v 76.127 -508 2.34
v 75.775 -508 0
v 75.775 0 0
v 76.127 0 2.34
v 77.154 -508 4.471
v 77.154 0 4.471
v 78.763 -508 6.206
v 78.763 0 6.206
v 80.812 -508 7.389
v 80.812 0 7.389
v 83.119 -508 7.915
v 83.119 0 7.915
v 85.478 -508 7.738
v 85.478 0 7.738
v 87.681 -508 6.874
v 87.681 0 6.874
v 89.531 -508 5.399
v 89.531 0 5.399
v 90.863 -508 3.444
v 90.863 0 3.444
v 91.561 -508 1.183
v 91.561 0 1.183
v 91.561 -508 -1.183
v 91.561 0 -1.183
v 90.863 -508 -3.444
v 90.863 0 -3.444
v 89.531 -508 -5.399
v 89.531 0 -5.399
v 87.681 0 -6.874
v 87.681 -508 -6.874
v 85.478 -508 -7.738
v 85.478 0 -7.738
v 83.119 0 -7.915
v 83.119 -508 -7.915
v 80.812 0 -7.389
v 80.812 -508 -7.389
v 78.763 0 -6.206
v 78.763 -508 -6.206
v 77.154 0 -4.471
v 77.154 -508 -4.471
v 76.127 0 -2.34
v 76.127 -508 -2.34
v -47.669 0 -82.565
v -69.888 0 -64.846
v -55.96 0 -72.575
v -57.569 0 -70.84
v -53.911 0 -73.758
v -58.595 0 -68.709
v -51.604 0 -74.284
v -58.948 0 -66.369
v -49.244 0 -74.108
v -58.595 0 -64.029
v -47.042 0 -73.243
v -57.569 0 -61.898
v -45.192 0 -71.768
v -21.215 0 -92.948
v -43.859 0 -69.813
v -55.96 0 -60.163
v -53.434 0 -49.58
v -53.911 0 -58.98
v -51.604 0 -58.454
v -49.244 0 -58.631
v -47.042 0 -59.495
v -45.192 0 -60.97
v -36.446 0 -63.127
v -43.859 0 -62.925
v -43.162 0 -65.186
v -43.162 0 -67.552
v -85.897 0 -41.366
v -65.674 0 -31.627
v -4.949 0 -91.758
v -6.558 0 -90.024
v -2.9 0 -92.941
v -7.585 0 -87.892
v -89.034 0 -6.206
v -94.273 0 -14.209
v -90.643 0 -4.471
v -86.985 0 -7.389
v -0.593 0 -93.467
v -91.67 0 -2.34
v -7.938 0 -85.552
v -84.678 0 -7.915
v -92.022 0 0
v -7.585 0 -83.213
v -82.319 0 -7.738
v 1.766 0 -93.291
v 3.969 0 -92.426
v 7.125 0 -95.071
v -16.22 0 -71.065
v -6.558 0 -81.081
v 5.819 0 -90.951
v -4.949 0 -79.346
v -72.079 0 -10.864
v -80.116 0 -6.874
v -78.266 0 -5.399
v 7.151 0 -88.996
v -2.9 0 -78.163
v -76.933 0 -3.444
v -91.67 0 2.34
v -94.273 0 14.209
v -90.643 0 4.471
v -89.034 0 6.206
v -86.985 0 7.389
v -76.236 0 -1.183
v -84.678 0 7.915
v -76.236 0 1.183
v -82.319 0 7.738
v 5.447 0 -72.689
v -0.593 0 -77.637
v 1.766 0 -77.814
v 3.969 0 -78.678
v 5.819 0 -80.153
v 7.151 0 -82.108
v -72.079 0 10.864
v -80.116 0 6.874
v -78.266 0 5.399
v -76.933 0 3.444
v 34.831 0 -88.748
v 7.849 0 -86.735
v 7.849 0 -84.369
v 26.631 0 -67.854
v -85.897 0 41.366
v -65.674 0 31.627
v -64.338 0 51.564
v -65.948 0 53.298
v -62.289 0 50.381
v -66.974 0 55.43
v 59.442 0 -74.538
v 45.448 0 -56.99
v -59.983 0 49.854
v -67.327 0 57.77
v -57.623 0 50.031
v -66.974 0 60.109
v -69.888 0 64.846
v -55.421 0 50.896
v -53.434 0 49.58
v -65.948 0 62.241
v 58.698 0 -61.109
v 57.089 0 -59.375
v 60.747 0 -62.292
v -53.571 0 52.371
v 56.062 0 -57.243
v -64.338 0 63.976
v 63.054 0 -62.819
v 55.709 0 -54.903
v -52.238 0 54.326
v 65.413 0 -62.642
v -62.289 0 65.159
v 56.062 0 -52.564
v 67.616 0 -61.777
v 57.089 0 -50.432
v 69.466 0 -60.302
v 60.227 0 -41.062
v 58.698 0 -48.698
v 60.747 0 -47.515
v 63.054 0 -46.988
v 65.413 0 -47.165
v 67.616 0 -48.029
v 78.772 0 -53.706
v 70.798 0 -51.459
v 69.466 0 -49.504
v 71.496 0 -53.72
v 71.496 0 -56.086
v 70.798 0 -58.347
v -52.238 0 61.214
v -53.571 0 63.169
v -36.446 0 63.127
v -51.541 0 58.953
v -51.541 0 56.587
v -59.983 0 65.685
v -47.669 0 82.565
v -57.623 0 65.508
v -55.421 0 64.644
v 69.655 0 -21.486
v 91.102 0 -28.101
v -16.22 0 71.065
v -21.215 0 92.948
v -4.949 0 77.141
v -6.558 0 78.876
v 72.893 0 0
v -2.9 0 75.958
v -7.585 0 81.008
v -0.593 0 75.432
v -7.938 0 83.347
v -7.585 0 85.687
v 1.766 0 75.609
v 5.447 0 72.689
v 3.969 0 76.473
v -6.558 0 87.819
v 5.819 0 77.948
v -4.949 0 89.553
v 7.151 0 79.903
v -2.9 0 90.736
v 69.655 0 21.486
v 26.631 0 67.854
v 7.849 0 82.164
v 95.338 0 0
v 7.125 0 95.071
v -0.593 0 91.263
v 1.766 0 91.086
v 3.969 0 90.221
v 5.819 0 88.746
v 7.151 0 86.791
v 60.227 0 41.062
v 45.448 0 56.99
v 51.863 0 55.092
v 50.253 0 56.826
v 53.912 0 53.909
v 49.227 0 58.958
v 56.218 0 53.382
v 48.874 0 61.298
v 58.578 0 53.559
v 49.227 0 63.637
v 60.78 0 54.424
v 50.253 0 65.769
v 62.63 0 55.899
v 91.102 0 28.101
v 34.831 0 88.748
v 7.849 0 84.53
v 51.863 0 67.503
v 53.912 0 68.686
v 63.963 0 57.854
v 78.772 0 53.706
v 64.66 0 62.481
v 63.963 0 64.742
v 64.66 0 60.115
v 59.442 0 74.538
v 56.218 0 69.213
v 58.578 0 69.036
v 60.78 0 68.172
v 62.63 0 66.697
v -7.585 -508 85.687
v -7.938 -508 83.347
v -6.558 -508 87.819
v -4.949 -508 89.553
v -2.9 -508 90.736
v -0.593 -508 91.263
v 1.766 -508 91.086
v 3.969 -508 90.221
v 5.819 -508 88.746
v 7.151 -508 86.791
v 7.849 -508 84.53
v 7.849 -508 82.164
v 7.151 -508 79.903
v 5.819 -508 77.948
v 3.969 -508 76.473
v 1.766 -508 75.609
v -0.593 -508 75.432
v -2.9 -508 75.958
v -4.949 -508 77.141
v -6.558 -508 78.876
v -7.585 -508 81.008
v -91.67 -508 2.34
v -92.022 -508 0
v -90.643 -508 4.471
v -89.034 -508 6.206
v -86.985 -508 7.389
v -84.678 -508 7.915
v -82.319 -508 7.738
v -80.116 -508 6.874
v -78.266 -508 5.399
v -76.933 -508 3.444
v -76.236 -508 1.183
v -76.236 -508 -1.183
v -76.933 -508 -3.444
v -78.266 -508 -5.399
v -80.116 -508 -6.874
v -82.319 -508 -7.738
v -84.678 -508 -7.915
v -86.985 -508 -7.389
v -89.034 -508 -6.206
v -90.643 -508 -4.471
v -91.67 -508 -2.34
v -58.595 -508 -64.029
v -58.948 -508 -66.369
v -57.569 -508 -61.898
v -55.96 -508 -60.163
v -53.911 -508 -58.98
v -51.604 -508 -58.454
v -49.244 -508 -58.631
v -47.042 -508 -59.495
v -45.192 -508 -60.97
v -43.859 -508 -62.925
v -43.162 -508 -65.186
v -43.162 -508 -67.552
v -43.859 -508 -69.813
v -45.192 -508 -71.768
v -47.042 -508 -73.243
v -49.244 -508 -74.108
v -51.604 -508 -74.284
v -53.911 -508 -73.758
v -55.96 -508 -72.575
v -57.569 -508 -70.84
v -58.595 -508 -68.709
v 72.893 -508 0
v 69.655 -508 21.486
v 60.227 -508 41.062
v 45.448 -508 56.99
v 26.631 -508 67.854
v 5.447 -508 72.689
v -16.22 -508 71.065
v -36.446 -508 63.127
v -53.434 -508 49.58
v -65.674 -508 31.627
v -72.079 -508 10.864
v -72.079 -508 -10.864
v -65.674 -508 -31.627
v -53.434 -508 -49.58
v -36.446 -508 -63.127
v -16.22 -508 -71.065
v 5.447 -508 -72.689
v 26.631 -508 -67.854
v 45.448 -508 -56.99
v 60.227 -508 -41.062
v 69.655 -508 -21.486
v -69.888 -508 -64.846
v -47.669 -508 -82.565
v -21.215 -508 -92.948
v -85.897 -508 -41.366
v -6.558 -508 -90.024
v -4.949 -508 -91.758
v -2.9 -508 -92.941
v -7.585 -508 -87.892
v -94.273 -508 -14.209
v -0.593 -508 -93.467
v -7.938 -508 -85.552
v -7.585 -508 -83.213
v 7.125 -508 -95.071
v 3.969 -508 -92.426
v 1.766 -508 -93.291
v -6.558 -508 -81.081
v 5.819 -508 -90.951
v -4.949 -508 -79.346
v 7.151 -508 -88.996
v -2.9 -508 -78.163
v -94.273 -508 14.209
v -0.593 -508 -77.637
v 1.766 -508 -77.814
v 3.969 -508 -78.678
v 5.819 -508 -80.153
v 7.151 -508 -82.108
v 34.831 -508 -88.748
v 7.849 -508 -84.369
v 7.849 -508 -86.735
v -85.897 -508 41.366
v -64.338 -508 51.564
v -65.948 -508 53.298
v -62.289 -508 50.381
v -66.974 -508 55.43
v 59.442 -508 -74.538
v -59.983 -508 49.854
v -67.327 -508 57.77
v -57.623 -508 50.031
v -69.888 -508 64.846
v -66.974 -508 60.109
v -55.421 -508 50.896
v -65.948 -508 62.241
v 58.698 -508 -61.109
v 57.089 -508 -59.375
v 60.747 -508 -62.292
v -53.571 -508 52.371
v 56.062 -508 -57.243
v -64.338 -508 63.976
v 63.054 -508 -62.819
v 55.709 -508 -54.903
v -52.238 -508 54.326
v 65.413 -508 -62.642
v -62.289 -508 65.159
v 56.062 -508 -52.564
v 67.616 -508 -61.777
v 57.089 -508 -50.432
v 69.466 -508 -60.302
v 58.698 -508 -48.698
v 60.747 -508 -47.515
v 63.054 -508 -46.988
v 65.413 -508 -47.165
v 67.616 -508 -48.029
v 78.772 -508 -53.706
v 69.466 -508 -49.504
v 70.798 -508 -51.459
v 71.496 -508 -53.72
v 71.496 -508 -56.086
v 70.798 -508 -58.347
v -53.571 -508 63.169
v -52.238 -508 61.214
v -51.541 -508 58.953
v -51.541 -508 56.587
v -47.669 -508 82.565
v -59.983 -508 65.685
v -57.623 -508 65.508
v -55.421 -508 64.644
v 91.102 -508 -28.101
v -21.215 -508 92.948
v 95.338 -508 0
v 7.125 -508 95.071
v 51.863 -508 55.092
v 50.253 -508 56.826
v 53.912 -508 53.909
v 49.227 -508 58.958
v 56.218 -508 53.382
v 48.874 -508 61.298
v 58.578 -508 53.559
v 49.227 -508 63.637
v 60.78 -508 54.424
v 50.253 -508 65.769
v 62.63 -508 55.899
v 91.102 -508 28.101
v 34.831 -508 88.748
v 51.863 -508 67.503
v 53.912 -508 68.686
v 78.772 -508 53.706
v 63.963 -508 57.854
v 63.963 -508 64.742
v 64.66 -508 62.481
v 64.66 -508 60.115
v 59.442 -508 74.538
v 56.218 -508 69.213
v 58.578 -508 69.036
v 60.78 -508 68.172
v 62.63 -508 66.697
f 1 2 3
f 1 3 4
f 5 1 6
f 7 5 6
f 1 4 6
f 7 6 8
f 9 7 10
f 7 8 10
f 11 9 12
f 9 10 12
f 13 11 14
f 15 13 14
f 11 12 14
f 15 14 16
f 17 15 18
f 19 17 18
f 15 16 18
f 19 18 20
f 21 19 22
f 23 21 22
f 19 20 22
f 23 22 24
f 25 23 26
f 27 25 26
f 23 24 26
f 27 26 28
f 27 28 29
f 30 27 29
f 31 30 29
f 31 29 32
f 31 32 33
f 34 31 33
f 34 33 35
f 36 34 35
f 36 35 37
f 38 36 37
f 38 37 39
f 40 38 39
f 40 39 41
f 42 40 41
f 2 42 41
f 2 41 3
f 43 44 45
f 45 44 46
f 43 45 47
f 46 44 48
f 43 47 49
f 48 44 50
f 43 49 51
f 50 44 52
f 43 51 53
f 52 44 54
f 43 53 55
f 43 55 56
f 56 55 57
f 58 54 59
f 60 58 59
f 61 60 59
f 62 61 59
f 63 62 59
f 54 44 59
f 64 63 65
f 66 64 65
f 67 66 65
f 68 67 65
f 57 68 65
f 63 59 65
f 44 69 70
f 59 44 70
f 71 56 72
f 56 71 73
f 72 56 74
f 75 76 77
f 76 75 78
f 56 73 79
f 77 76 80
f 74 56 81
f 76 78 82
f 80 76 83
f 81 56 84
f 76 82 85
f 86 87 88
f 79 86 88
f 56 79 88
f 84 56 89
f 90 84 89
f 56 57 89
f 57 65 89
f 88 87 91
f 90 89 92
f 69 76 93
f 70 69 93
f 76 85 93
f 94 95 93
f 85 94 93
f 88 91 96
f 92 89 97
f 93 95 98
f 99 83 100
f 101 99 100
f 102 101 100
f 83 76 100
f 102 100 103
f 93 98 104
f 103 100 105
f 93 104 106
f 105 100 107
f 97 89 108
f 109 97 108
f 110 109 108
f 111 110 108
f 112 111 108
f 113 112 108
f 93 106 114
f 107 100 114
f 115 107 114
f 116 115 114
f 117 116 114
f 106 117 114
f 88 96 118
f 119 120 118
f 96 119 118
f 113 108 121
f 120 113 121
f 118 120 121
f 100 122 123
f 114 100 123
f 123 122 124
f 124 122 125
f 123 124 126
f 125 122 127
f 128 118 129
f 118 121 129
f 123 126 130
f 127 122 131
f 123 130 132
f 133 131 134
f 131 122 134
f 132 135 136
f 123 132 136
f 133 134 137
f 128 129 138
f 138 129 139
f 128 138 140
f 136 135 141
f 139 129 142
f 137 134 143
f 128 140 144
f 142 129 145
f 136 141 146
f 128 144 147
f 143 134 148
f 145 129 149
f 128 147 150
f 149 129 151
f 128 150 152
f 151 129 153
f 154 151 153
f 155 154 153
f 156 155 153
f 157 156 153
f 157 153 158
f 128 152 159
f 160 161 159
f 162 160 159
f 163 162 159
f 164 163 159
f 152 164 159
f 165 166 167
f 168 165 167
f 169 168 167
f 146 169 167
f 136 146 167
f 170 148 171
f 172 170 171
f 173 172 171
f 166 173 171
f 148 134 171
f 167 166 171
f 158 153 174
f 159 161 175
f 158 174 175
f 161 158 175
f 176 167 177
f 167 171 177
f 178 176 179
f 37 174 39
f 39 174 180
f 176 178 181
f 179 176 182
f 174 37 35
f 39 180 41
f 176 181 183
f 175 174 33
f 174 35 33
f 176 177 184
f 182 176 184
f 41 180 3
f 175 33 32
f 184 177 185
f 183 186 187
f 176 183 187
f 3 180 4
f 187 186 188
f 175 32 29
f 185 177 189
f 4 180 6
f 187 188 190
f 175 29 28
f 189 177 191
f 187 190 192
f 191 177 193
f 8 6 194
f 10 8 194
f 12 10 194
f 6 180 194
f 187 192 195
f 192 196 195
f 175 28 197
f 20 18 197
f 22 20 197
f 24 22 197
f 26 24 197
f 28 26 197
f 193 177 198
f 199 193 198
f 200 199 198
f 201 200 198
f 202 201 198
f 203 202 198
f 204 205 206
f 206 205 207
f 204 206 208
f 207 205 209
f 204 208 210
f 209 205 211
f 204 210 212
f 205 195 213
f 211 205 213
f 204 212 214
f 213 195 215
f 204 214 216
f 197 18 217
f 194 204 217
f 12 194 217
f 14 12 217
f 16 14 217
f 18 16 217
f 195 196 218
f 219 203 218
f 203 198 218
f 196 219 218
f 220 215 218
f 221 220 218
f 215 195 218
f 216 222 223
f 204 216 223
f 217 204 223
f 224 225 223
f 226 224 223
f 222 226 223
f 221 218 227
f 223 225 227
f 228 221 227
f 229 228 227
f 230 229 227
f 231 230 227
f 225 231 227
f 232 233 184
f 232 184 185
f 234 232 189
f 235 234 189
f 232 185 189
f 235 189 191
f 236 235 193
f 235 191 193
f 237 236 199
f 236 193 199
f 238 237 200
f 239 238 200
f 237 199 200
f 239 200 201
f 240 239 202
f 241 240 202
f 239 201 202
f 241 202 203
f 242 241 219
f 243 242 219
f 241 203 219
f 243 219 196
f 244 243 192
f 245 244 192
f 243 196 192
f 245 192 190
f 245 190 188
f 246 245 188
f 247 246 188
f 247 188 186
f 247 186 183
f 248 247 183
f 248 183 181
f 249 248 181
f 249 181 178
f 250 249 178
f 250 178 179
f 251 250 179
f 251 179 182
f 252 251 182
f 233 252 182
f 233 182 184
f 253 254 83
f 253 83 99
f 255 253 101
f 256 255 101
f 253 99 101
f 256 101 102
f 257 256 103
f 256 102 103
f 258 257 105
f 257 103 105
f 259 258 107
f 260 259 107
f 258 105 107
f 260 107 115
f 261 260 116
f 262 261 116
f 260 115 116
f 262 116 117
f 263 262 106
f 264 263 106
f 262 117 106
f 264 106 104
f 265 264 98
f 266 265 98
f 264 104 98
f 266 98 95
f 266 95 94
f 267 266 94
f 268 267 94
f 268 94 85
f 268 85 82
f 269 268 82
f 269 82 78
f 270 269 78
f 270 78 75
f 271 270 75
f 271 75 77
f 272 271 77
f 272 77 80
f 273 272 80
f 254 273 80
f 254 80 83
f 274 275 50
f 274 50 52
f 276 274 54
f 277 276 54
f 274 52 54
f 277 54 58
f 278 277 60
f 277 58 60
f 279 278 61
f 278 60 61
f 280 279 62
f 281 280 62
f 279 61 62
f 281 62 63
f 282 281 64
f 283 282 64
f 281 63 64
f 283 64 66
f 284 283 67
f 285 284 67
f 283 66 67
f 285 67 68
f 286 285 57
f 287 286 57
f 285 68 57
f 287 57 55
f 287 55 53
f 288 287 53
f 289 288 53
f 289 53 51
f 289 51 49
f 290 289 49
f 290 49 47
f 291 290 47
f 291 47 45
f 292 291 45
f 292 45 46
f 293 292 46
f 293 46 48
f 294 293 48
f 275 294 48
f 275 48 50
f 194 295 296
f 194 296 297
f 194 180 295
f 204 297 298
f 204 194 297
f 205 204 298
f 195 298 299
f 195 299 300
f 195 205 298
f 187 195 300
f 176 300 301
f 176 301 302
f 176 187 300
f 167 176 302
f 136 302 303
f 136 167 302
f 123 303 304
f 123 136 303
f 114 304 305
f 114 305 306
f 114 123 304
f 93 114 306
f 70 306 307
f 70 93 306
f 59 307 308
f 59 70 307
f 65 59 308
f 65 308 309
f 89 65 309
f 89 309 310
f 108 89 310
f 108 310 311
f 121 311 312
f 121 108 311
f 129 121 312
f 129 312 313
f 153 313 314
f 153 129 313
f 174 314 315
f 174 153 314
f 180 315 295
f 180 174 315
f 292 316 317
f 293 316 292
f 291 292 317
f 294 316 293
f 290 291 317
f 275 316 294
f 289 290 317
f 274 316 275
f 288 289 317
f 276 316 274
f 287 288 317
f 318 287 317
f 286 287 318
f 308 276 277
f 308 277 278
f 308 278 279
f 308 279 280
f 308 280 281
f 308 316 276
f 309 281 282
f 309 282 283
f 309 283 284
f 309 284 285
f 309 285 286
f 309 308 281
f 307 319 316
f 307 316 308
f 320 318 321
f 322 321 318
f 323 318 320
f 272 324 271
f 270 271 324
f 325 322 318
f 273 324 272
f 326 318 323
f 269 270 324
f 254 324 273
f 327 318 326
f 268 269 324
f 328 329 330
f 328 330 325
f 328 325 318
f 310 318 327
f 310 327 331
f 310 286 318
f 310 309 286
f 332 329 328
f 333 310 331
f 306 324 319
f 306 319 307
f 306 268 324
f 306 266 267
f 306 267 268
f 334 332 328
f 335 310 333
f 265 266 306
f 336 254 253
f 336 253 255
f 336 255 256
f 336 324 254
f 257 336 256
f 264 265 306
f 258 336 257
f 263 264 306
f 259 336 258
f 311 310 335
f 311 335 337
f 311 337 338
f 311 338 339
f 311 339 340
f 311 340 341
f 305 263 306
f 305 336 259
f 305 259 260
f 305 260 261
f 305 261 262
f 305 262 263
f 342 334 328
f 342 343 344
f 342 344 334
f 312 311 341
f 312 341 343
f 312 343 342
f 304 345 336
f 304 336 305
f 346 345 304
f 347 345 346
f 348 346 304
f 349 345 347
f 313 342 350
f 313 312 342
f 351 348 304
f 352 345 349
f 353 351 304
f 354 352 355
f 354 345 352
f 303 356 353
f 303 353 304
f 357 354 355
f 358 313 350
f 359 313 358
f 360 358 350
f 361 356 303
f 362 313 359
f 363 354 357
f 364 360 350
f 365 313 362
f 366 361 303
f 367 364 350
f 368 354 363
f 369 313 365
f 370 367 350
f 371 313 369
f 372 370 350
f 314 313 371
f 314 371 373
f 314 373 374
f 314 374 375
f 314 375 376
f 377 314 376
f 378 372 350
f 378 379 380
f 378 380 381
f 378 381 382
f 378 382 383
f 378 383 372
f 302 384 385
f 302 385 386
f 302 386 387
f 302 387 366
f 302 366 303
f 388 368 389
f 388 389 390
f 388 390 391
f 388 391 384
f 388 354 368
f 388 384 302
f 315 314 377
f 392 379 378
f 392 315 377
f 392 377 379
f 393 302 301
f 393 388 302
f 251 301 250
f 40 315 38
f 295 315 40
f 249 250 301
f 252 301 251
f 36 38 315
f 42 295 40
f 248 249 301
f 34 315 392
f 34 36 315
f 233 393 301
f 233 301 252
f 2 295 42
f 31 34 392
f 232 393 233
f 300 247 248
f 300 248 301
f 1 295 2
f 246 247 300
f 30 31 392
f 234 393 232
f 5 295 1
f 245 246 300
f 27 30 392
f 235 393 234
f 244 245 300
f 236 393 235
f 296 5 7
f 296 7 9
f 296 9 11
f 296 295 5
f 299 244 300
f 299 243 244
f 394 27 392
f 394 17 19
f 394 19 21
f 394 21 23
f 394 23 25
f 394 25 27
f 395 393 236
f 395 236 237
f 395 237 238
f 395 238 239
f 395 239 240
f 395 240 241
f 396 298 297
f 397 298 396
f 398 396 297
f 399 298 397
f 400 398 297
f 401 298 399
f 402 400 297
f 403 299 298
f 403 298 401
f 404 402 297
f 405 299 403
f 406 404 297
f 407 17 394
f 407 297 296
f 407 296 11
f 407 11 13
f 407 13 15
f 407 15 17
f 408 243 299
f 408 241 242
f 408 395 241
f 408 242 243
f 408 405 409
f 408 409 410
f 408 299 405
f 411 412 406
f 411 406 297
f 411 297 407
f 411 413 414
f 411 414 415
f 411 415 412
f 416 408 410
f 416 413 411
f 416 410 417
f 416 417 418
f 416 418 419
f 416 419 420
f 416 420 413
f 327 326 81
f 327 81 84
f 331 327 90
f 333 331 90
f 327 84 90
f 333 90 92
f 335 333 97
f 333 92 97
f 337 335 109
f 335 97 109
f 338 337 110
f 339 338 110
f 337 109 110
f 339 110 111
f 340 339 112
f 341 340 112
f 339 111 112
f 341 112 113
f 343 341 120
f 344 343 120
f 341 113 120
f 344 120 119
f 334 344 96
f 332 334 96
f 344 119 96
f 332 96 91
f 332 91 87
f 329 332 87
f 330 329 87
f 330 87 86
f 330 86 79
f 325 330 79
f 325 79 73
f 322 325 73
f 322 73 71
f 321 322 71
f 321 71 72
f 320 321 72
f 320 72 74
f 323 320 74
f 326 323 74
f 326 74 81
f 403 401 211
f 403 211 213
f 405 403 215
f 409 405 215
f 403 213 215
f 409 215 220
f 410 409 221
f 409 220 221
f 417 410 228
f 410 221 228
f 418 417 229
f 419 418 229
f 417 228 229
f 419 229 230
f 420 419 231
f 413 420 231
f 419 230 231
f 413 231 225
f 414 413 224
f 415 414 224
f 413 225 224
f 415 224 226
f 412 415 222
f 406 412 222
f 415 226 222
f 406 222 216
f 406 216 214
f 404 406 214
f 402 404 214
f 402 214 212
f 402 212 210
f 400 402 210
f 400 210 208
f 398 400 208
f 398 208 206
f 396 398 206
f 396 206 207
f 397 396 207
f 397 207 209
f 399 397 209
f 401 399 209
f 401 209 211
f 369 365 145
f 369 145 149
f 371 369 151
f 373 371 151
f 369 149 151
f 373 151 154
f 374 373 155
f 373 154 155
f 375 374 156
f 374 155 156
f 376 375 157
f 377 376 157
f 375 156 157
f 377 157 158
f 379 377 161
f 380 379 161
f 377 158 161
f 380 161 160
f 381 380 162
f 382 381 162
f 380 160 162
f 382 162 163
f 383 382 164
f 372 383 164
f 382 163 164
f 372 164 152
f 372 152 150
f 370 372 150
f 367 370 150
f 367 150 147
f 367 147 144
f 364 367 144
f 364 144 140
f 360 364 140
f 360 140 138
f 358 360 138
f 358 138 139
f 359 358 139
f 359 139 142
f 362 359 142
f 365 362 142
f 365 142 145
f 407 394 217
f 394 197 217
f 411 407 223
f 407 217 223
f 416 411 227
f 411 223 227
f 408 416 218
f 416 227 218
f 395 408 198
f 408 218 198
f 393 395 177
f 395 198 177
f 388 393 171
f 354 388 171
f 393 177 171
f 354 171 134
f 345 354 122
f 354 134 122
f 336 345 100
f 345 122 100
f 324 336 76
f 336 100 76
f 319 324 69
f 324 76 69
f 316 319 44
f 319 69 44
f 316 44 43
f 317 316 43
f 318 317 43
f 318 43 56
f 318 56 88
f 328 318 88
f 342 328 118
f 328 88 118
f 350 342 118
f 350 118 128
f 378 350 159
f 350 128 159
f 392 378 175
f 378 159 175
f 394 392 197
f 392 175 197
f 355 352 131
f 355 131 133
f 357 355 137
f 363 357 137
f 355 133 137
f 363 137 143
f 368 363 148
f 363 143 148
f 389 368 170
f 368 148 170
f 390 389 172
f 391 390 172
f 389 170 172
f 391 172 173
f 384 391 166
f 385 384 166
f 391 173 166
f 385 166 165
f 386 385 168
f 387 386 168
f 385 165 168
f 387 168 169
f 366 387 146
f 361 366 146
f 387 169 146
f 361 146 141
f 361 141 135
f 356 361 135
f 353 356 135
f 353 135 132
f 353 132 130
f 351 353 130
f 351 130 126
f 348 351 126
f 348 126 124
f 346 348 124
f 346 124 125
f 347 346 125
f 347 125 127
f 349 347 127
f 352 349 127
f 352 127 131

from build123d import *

# Parameters (mm, degrees)
F0_R        = 95.337967
F0_R_2      = 72.892959
F1_DEPTH    = 254
F1_FACE_R   = 95.337967
F1_FACE_R_2 = 72.892959
F2_DEPTH    = 254
F4_D        = 15.875


with BuildPart() as f1:
    # F0 (on Front) → F1 (new body)
    with BuildSketch(Plane.XZ):
        Circle(F0_R)
        Circle(F0_R_2, mode=Mode.SUBTRACT)
    extrude(amount=F1_DEPTH)

    # F1_face (on face) → F2 (join)
    with BuildSketch(Plane.XZ.offset(254)):
        Circle(F1_FACE_R)
        Circle(F1_FACE_R_2, mode=Mode.SUBTRACT)
    extrude(amount=F2_DEPTH)

    # F4 (through all)
    with Locations(Plane.XZ.offset(508)):
        with Locations((-59.389438, 57.769768), (-84.084906, 0), (0, 83.347216), (56.811582, 61.297689), (83.712012, 0), (63.646935, -54.903328), (0, -85.552171), (-51.010616, -66.369079)):
            Hole(F4_D / 2)


solid = f1.part
